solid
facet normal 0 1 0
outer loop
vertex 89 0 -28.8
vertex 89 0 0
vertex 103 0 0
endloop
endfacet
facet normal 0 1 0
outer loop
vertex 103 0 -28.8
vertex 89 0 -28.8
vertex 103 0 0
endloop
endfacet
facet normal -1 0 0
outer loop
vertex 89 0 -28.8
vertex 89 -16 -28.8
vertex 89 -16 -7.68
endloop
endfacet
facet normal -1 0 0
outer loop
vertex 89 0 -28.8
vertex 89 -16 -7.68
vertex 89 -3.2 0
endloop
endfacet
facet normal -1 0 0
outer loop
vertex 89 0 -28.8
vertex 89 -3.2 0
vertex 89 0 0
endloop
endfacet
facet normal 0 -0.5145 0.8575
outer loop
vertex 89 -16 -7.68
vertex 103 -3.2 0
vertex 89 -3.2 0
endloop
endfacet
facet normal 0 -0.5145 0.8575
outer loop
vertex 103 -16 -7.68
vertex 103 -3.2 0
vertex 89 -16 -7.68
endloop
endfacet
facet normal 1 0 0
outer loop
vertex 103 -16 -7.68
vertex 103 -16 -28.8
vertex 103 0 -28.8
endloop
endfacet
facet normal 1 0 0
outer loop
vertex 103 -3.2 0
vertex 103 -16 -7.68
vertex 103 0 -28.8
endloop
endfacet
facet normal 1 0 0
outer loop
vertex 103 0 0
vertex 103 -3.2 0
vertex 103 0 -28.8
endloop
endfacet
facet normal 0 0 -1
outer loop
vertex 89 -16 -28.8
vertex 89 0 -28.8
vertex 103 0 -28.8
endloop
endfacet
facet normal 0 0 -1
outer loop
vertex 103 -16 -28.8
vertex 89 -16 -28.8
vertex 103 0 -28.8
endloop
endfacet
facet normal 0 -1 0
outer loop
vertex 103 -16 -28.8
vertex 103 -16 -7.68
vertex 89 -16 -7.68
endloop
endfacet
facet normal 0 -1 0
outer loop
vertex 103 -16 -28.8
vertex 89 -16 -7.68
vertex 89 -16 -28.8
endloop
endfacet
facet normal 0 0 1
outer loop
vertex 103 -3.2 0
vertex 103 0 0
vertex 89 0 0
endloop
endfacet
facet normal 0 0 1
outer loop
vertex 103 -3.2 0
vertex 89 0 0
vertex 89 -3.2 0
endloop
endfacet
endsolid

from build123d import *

# Parameters (mm, degrees)
SKETCH032_W     = 16
SKETCH032_H     = 16
PAD017_DEPTH    = 28.8
POCKET015_DEPTH = 16
SKETCH115_W     = 1
SKETCH115_H     = 16
POCKET031_DEPTH = 30
PAD134_DEPTH    = 14


with BuildPart() as part:
    # Sketch032 (on Face52 of Binder013) → Pad017 (new body)
    with BuildSketch(Plane.XY.offset(-28.8)):
        with Locations((96, -8)):
            Rectangle(SKETCH032_W, SKETCH032_H)
    extrude(amount=PAD017_DEPTH)

    # Sketch033 (on Face2 of Pad017) → Pocket015 (cut)
    with BuildSketch(Plane.YZ.offset(104)):
        Polygon((-16, 0), (-16, -9.6), (0, 0), align=None)
    extrude(amount=-POCKET015_DEPTH, mode=Mode.SUBTRACT)

    # Sketch115 (on Face2 of Pocket015) → Pocket031 (cut)
    with BuildSketch(Plane(origin=(0, 0, -28.8), x_dir=(1, 0, 0), z_dir=(0, 0, -1))):
        with Locations((103.5, 8)):
            Rectangle(SKETCH115_W, SKETCH115_H)
        with Locations((88.5, 8)):
            Rectangle(SKETCH115_W, SKETCH115_H)
    extrude(amount=-POCKET031_DEPTH, mode=Mode.SUBTRACT)

    # Sketch134 (on Face3 of Pocket031) → Pad134 (join)
    with BuildSketch(Plane.YZ.offset(103)):
        Polygon((0, 0), (-3.2, 0), (-16, -7.68), (-16, -10.88), (-3.2, -3.2), (0, -3.2), align=None)
    extrude(amount=-PAD134_DEPTH)


solid = part.part
